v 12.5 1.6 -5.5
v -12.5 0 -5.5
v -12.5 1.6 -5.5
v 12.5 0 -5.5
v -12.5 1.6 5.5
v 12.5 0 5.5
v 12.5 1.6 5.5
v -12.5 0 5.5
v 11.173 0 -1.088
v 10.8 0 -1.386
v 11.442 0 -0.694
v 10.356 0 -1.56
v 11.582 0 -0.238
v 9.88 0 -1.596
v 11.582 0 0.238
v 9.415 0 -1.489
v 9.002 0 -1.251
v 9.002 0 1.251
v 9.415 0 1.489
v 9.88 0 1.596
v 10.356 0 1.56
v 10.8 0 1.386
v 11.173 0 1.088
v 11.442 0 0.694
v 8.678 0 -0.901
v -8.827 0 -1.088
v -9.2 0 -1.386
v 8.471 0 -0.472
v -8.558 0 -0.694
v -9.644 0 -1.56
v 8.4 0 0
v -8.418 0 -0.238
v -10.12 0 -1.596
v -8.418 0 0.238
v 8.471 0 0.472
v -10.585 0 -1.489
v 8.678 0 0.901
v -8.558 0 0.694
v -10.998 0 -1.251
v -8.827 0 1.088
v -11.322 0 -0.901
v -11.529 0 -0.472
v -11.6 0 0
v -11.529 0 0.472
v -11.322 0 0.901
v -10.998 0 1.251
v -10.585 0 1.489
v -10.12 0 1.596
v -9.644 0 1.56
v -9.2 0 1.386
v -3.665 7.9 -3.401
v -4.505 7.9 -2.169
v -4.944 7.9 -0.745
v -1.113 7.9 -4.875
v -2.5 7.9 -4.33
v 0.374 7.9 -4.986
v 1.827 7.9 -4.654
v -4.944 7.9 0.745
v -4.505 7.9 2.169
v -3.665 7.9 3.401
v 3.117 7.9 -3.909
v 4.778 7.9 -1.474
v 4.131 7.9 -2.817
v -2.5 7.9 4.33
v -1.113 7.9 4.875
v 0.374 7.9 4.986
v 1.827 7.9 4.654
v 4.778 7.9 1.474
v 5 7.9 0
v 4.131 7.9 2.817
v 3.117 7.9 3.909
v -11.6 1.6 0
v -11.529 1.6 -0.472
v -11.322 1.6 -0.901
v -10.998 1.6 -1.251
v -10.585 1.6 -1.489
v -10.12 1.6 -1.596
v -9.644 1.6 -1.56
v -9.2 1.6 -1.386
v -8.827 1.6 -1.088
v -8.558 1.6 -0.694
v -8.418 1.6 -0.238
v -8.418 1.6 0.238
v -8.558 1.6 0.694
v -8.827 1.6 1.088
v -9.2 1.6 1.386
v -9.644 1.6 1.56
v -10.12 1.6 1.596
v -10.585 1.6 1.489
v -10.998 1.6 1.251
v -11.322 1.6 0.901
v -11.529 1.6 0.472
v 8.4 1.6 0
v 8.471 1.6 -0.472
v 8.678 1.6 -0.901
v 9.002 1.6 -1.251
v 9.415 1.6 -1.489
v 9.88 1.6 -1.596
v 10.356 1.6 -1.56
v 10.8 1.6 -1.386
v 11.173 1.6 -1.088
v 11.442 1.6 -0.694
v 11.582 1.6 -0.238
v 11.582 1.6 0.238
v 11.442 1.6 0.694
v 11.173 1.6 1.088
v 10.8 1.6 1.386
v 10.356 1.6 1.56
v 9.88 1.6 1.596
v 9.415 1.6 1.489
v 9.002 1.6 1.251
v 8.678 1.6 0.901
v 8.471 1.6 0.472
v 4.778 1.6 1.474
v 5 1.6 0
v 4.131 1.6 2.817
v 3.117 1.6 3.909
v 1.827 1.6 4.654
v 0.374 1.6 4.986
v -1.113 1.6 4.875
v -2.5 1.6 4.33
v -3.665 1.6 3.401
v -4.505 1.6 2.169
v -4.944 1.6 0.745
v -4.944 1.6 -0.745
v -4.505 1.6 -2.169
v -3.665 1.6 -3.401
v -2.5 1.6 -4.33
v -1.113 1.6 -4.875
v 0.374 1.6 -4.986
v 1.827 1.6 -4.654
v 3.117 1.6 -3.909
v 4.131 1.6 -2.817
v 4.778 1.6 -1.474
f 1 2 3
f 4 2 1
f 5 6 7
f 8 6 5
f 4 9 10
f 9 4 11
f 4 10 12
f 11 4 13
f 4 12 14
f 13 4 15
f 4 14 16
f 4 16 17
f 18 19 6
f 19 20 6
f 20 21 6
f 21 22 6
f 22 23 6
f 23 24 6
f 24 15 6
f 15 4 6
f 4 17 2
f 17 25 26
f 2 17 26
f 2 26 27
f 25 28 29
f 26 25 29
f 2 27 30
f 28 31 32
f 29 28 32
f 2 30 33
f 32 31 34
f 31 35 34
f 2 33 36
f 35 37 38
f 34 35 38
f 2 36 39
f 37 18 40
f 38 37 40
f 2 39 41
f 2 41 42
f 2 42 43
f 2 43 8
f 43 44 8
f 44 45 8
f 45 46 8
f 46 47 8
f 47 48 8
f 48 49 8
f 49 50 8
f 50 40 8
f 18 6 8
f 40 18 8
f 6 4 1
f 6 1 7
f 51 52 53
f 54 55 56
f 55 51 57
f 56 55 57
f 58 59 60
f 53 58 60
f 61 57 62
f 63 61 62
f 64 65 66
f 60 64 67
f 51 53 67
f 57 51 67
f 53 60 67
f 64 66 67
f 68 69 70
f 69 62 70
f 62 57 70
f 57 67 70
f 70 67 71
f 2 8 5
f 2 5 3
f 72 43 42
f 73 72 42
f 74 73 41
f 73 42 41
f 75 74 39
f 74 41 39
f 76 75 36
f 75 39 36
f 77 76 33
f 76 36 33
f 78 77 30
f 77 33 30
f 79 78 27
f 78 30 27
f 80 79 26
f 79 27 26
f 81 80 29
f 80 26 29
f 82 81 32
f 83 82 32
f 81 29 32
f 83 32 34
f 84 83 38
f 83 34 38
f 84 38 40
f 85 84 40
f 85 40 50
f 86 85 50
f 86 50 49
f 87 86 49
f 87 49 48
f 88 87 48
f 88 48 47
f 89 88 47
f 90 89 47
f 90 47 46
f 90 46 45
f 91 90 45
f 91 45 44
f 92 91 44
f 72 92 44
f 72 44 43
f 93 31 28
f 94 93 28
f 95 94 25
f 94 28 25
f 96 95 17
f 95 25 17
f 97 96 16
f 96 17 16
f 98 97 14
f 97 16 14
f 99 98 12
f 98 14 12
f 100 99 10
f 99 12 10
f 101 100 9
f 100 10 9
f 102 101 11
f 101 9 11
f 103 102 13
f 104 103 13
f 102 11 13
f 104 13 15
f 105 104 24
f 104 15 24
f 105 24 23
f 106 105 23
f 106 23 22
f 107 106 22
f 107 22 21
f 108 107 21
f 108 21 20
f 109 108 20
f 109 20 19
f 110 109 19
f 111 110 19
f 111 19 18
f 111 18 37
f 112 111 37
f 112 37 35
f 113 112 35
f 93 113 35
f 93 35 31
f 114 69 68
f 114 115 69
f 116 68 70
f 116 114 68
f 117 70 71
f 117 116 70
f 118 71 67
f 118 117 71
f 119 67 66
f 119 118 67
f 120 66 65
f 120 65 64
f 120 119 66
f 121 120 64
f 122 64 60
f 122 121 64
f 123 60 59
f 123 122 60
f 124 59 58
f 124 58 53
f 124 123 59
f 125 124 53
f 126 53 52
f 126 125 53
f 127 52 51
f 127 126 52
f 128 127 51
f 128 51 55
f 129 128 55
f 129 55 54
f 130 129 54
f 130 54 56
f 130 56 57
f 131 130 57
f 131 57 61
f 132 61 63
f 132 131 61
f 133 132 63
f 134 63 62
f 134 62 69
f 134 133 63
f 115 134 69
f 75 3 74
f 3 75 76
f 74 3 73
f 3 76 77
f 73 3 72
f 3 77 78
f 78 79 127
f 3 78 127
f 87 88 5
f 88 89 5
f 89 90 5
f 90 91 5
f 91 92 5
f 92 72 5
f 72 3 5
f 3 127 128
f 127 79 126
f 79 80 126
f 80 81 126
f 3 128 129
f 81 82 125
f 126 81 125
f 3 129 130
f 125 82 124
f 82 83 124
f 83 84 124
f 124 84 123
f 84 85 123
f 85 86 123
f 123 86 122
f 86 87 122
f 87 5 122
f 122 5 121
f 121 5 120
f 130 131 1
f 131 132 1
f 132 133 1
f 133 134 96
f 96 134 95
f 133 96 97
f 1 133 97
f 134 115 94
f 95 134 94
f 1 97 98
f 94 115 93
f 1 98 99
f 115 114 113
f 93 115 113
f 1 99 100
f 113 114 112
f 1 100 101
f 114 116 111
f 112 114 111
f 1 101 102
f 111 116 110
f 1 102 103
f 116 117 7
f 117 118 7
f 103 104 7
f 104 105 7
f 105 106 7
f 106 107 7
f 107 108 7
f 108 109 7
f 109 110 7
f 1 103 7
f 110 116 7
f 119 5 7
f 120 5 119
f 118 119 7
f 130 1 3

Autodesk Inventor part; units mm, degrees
ref_plane "YZ Plane" through (0, 0, 0) normal (1, 0, 0) x (0, 1, 0)
ref_plane "XZ Plane" through (0, 0, 0) normal (0, 1, 0) x (-1, 0, 0)
ref_plane "XY Plane" through (0, 0, 0) normal (0, 0, 1) x (1, 0, 0)
sketch "草圖1" plane through (0, 0, 0) normal (0, 0, 1) x (1, 0, 0)
  line L0 (0, 7.9) -> (5, 7.9)
  line L1 (5, 7.9) -> (5, 1.6)
  line L2 (5, 1.6) -> (15, 1.6)
  line L3 (15, 1.6) -> (15, 0)
  line L4 (15, 0) -> (0, 0)
  line L5 (0, 7.9) -> (0, 0)
  point P0 (0, 0)
  dimension "d1" = 1.6
  dimension "d2" = 10
  dimension "d3" = 30
  dimension "d4" = 6.3
revolve "迴轉1" add sketch "草圖1" angle 360 about axis through (0, 7.9, 0) along (0, -1, 0)
sketch "草圖2" plane through (0, 0, 0) normal (0, 1, 0) x (-1, 0, 0)
  line L0 (12.5, -5.5) -> (-12.5, -5.5)
  line L1 (-12.5, -5.5) -> (-12.5, 5.5)
  line L2 (-12.5, 5.5) -> (12.5, 5.5)
  line L3 (12.5, 5.5) -> (12.5, -5.5)
  circle A0 centre (10, 0) radius 1.6
  circle A1 centre (-10, 0) radius 1.6
  line L4 (10, 0) -> (-10, 0) construction
  point P0 (0, 0)
  point P1 (0, -5.5)
  point P2 (-12.5, 0)
  point P3 (0, 0)
  dimension "d6" = 11
  dimension "d7" = 25
  dimension "d8" = 3.2
  dimension "d9" = 20
extrude "擠出1" cut sketch "草圖2" along normal through all keep common part
properties part number "磁鐵b" material "SS41"
